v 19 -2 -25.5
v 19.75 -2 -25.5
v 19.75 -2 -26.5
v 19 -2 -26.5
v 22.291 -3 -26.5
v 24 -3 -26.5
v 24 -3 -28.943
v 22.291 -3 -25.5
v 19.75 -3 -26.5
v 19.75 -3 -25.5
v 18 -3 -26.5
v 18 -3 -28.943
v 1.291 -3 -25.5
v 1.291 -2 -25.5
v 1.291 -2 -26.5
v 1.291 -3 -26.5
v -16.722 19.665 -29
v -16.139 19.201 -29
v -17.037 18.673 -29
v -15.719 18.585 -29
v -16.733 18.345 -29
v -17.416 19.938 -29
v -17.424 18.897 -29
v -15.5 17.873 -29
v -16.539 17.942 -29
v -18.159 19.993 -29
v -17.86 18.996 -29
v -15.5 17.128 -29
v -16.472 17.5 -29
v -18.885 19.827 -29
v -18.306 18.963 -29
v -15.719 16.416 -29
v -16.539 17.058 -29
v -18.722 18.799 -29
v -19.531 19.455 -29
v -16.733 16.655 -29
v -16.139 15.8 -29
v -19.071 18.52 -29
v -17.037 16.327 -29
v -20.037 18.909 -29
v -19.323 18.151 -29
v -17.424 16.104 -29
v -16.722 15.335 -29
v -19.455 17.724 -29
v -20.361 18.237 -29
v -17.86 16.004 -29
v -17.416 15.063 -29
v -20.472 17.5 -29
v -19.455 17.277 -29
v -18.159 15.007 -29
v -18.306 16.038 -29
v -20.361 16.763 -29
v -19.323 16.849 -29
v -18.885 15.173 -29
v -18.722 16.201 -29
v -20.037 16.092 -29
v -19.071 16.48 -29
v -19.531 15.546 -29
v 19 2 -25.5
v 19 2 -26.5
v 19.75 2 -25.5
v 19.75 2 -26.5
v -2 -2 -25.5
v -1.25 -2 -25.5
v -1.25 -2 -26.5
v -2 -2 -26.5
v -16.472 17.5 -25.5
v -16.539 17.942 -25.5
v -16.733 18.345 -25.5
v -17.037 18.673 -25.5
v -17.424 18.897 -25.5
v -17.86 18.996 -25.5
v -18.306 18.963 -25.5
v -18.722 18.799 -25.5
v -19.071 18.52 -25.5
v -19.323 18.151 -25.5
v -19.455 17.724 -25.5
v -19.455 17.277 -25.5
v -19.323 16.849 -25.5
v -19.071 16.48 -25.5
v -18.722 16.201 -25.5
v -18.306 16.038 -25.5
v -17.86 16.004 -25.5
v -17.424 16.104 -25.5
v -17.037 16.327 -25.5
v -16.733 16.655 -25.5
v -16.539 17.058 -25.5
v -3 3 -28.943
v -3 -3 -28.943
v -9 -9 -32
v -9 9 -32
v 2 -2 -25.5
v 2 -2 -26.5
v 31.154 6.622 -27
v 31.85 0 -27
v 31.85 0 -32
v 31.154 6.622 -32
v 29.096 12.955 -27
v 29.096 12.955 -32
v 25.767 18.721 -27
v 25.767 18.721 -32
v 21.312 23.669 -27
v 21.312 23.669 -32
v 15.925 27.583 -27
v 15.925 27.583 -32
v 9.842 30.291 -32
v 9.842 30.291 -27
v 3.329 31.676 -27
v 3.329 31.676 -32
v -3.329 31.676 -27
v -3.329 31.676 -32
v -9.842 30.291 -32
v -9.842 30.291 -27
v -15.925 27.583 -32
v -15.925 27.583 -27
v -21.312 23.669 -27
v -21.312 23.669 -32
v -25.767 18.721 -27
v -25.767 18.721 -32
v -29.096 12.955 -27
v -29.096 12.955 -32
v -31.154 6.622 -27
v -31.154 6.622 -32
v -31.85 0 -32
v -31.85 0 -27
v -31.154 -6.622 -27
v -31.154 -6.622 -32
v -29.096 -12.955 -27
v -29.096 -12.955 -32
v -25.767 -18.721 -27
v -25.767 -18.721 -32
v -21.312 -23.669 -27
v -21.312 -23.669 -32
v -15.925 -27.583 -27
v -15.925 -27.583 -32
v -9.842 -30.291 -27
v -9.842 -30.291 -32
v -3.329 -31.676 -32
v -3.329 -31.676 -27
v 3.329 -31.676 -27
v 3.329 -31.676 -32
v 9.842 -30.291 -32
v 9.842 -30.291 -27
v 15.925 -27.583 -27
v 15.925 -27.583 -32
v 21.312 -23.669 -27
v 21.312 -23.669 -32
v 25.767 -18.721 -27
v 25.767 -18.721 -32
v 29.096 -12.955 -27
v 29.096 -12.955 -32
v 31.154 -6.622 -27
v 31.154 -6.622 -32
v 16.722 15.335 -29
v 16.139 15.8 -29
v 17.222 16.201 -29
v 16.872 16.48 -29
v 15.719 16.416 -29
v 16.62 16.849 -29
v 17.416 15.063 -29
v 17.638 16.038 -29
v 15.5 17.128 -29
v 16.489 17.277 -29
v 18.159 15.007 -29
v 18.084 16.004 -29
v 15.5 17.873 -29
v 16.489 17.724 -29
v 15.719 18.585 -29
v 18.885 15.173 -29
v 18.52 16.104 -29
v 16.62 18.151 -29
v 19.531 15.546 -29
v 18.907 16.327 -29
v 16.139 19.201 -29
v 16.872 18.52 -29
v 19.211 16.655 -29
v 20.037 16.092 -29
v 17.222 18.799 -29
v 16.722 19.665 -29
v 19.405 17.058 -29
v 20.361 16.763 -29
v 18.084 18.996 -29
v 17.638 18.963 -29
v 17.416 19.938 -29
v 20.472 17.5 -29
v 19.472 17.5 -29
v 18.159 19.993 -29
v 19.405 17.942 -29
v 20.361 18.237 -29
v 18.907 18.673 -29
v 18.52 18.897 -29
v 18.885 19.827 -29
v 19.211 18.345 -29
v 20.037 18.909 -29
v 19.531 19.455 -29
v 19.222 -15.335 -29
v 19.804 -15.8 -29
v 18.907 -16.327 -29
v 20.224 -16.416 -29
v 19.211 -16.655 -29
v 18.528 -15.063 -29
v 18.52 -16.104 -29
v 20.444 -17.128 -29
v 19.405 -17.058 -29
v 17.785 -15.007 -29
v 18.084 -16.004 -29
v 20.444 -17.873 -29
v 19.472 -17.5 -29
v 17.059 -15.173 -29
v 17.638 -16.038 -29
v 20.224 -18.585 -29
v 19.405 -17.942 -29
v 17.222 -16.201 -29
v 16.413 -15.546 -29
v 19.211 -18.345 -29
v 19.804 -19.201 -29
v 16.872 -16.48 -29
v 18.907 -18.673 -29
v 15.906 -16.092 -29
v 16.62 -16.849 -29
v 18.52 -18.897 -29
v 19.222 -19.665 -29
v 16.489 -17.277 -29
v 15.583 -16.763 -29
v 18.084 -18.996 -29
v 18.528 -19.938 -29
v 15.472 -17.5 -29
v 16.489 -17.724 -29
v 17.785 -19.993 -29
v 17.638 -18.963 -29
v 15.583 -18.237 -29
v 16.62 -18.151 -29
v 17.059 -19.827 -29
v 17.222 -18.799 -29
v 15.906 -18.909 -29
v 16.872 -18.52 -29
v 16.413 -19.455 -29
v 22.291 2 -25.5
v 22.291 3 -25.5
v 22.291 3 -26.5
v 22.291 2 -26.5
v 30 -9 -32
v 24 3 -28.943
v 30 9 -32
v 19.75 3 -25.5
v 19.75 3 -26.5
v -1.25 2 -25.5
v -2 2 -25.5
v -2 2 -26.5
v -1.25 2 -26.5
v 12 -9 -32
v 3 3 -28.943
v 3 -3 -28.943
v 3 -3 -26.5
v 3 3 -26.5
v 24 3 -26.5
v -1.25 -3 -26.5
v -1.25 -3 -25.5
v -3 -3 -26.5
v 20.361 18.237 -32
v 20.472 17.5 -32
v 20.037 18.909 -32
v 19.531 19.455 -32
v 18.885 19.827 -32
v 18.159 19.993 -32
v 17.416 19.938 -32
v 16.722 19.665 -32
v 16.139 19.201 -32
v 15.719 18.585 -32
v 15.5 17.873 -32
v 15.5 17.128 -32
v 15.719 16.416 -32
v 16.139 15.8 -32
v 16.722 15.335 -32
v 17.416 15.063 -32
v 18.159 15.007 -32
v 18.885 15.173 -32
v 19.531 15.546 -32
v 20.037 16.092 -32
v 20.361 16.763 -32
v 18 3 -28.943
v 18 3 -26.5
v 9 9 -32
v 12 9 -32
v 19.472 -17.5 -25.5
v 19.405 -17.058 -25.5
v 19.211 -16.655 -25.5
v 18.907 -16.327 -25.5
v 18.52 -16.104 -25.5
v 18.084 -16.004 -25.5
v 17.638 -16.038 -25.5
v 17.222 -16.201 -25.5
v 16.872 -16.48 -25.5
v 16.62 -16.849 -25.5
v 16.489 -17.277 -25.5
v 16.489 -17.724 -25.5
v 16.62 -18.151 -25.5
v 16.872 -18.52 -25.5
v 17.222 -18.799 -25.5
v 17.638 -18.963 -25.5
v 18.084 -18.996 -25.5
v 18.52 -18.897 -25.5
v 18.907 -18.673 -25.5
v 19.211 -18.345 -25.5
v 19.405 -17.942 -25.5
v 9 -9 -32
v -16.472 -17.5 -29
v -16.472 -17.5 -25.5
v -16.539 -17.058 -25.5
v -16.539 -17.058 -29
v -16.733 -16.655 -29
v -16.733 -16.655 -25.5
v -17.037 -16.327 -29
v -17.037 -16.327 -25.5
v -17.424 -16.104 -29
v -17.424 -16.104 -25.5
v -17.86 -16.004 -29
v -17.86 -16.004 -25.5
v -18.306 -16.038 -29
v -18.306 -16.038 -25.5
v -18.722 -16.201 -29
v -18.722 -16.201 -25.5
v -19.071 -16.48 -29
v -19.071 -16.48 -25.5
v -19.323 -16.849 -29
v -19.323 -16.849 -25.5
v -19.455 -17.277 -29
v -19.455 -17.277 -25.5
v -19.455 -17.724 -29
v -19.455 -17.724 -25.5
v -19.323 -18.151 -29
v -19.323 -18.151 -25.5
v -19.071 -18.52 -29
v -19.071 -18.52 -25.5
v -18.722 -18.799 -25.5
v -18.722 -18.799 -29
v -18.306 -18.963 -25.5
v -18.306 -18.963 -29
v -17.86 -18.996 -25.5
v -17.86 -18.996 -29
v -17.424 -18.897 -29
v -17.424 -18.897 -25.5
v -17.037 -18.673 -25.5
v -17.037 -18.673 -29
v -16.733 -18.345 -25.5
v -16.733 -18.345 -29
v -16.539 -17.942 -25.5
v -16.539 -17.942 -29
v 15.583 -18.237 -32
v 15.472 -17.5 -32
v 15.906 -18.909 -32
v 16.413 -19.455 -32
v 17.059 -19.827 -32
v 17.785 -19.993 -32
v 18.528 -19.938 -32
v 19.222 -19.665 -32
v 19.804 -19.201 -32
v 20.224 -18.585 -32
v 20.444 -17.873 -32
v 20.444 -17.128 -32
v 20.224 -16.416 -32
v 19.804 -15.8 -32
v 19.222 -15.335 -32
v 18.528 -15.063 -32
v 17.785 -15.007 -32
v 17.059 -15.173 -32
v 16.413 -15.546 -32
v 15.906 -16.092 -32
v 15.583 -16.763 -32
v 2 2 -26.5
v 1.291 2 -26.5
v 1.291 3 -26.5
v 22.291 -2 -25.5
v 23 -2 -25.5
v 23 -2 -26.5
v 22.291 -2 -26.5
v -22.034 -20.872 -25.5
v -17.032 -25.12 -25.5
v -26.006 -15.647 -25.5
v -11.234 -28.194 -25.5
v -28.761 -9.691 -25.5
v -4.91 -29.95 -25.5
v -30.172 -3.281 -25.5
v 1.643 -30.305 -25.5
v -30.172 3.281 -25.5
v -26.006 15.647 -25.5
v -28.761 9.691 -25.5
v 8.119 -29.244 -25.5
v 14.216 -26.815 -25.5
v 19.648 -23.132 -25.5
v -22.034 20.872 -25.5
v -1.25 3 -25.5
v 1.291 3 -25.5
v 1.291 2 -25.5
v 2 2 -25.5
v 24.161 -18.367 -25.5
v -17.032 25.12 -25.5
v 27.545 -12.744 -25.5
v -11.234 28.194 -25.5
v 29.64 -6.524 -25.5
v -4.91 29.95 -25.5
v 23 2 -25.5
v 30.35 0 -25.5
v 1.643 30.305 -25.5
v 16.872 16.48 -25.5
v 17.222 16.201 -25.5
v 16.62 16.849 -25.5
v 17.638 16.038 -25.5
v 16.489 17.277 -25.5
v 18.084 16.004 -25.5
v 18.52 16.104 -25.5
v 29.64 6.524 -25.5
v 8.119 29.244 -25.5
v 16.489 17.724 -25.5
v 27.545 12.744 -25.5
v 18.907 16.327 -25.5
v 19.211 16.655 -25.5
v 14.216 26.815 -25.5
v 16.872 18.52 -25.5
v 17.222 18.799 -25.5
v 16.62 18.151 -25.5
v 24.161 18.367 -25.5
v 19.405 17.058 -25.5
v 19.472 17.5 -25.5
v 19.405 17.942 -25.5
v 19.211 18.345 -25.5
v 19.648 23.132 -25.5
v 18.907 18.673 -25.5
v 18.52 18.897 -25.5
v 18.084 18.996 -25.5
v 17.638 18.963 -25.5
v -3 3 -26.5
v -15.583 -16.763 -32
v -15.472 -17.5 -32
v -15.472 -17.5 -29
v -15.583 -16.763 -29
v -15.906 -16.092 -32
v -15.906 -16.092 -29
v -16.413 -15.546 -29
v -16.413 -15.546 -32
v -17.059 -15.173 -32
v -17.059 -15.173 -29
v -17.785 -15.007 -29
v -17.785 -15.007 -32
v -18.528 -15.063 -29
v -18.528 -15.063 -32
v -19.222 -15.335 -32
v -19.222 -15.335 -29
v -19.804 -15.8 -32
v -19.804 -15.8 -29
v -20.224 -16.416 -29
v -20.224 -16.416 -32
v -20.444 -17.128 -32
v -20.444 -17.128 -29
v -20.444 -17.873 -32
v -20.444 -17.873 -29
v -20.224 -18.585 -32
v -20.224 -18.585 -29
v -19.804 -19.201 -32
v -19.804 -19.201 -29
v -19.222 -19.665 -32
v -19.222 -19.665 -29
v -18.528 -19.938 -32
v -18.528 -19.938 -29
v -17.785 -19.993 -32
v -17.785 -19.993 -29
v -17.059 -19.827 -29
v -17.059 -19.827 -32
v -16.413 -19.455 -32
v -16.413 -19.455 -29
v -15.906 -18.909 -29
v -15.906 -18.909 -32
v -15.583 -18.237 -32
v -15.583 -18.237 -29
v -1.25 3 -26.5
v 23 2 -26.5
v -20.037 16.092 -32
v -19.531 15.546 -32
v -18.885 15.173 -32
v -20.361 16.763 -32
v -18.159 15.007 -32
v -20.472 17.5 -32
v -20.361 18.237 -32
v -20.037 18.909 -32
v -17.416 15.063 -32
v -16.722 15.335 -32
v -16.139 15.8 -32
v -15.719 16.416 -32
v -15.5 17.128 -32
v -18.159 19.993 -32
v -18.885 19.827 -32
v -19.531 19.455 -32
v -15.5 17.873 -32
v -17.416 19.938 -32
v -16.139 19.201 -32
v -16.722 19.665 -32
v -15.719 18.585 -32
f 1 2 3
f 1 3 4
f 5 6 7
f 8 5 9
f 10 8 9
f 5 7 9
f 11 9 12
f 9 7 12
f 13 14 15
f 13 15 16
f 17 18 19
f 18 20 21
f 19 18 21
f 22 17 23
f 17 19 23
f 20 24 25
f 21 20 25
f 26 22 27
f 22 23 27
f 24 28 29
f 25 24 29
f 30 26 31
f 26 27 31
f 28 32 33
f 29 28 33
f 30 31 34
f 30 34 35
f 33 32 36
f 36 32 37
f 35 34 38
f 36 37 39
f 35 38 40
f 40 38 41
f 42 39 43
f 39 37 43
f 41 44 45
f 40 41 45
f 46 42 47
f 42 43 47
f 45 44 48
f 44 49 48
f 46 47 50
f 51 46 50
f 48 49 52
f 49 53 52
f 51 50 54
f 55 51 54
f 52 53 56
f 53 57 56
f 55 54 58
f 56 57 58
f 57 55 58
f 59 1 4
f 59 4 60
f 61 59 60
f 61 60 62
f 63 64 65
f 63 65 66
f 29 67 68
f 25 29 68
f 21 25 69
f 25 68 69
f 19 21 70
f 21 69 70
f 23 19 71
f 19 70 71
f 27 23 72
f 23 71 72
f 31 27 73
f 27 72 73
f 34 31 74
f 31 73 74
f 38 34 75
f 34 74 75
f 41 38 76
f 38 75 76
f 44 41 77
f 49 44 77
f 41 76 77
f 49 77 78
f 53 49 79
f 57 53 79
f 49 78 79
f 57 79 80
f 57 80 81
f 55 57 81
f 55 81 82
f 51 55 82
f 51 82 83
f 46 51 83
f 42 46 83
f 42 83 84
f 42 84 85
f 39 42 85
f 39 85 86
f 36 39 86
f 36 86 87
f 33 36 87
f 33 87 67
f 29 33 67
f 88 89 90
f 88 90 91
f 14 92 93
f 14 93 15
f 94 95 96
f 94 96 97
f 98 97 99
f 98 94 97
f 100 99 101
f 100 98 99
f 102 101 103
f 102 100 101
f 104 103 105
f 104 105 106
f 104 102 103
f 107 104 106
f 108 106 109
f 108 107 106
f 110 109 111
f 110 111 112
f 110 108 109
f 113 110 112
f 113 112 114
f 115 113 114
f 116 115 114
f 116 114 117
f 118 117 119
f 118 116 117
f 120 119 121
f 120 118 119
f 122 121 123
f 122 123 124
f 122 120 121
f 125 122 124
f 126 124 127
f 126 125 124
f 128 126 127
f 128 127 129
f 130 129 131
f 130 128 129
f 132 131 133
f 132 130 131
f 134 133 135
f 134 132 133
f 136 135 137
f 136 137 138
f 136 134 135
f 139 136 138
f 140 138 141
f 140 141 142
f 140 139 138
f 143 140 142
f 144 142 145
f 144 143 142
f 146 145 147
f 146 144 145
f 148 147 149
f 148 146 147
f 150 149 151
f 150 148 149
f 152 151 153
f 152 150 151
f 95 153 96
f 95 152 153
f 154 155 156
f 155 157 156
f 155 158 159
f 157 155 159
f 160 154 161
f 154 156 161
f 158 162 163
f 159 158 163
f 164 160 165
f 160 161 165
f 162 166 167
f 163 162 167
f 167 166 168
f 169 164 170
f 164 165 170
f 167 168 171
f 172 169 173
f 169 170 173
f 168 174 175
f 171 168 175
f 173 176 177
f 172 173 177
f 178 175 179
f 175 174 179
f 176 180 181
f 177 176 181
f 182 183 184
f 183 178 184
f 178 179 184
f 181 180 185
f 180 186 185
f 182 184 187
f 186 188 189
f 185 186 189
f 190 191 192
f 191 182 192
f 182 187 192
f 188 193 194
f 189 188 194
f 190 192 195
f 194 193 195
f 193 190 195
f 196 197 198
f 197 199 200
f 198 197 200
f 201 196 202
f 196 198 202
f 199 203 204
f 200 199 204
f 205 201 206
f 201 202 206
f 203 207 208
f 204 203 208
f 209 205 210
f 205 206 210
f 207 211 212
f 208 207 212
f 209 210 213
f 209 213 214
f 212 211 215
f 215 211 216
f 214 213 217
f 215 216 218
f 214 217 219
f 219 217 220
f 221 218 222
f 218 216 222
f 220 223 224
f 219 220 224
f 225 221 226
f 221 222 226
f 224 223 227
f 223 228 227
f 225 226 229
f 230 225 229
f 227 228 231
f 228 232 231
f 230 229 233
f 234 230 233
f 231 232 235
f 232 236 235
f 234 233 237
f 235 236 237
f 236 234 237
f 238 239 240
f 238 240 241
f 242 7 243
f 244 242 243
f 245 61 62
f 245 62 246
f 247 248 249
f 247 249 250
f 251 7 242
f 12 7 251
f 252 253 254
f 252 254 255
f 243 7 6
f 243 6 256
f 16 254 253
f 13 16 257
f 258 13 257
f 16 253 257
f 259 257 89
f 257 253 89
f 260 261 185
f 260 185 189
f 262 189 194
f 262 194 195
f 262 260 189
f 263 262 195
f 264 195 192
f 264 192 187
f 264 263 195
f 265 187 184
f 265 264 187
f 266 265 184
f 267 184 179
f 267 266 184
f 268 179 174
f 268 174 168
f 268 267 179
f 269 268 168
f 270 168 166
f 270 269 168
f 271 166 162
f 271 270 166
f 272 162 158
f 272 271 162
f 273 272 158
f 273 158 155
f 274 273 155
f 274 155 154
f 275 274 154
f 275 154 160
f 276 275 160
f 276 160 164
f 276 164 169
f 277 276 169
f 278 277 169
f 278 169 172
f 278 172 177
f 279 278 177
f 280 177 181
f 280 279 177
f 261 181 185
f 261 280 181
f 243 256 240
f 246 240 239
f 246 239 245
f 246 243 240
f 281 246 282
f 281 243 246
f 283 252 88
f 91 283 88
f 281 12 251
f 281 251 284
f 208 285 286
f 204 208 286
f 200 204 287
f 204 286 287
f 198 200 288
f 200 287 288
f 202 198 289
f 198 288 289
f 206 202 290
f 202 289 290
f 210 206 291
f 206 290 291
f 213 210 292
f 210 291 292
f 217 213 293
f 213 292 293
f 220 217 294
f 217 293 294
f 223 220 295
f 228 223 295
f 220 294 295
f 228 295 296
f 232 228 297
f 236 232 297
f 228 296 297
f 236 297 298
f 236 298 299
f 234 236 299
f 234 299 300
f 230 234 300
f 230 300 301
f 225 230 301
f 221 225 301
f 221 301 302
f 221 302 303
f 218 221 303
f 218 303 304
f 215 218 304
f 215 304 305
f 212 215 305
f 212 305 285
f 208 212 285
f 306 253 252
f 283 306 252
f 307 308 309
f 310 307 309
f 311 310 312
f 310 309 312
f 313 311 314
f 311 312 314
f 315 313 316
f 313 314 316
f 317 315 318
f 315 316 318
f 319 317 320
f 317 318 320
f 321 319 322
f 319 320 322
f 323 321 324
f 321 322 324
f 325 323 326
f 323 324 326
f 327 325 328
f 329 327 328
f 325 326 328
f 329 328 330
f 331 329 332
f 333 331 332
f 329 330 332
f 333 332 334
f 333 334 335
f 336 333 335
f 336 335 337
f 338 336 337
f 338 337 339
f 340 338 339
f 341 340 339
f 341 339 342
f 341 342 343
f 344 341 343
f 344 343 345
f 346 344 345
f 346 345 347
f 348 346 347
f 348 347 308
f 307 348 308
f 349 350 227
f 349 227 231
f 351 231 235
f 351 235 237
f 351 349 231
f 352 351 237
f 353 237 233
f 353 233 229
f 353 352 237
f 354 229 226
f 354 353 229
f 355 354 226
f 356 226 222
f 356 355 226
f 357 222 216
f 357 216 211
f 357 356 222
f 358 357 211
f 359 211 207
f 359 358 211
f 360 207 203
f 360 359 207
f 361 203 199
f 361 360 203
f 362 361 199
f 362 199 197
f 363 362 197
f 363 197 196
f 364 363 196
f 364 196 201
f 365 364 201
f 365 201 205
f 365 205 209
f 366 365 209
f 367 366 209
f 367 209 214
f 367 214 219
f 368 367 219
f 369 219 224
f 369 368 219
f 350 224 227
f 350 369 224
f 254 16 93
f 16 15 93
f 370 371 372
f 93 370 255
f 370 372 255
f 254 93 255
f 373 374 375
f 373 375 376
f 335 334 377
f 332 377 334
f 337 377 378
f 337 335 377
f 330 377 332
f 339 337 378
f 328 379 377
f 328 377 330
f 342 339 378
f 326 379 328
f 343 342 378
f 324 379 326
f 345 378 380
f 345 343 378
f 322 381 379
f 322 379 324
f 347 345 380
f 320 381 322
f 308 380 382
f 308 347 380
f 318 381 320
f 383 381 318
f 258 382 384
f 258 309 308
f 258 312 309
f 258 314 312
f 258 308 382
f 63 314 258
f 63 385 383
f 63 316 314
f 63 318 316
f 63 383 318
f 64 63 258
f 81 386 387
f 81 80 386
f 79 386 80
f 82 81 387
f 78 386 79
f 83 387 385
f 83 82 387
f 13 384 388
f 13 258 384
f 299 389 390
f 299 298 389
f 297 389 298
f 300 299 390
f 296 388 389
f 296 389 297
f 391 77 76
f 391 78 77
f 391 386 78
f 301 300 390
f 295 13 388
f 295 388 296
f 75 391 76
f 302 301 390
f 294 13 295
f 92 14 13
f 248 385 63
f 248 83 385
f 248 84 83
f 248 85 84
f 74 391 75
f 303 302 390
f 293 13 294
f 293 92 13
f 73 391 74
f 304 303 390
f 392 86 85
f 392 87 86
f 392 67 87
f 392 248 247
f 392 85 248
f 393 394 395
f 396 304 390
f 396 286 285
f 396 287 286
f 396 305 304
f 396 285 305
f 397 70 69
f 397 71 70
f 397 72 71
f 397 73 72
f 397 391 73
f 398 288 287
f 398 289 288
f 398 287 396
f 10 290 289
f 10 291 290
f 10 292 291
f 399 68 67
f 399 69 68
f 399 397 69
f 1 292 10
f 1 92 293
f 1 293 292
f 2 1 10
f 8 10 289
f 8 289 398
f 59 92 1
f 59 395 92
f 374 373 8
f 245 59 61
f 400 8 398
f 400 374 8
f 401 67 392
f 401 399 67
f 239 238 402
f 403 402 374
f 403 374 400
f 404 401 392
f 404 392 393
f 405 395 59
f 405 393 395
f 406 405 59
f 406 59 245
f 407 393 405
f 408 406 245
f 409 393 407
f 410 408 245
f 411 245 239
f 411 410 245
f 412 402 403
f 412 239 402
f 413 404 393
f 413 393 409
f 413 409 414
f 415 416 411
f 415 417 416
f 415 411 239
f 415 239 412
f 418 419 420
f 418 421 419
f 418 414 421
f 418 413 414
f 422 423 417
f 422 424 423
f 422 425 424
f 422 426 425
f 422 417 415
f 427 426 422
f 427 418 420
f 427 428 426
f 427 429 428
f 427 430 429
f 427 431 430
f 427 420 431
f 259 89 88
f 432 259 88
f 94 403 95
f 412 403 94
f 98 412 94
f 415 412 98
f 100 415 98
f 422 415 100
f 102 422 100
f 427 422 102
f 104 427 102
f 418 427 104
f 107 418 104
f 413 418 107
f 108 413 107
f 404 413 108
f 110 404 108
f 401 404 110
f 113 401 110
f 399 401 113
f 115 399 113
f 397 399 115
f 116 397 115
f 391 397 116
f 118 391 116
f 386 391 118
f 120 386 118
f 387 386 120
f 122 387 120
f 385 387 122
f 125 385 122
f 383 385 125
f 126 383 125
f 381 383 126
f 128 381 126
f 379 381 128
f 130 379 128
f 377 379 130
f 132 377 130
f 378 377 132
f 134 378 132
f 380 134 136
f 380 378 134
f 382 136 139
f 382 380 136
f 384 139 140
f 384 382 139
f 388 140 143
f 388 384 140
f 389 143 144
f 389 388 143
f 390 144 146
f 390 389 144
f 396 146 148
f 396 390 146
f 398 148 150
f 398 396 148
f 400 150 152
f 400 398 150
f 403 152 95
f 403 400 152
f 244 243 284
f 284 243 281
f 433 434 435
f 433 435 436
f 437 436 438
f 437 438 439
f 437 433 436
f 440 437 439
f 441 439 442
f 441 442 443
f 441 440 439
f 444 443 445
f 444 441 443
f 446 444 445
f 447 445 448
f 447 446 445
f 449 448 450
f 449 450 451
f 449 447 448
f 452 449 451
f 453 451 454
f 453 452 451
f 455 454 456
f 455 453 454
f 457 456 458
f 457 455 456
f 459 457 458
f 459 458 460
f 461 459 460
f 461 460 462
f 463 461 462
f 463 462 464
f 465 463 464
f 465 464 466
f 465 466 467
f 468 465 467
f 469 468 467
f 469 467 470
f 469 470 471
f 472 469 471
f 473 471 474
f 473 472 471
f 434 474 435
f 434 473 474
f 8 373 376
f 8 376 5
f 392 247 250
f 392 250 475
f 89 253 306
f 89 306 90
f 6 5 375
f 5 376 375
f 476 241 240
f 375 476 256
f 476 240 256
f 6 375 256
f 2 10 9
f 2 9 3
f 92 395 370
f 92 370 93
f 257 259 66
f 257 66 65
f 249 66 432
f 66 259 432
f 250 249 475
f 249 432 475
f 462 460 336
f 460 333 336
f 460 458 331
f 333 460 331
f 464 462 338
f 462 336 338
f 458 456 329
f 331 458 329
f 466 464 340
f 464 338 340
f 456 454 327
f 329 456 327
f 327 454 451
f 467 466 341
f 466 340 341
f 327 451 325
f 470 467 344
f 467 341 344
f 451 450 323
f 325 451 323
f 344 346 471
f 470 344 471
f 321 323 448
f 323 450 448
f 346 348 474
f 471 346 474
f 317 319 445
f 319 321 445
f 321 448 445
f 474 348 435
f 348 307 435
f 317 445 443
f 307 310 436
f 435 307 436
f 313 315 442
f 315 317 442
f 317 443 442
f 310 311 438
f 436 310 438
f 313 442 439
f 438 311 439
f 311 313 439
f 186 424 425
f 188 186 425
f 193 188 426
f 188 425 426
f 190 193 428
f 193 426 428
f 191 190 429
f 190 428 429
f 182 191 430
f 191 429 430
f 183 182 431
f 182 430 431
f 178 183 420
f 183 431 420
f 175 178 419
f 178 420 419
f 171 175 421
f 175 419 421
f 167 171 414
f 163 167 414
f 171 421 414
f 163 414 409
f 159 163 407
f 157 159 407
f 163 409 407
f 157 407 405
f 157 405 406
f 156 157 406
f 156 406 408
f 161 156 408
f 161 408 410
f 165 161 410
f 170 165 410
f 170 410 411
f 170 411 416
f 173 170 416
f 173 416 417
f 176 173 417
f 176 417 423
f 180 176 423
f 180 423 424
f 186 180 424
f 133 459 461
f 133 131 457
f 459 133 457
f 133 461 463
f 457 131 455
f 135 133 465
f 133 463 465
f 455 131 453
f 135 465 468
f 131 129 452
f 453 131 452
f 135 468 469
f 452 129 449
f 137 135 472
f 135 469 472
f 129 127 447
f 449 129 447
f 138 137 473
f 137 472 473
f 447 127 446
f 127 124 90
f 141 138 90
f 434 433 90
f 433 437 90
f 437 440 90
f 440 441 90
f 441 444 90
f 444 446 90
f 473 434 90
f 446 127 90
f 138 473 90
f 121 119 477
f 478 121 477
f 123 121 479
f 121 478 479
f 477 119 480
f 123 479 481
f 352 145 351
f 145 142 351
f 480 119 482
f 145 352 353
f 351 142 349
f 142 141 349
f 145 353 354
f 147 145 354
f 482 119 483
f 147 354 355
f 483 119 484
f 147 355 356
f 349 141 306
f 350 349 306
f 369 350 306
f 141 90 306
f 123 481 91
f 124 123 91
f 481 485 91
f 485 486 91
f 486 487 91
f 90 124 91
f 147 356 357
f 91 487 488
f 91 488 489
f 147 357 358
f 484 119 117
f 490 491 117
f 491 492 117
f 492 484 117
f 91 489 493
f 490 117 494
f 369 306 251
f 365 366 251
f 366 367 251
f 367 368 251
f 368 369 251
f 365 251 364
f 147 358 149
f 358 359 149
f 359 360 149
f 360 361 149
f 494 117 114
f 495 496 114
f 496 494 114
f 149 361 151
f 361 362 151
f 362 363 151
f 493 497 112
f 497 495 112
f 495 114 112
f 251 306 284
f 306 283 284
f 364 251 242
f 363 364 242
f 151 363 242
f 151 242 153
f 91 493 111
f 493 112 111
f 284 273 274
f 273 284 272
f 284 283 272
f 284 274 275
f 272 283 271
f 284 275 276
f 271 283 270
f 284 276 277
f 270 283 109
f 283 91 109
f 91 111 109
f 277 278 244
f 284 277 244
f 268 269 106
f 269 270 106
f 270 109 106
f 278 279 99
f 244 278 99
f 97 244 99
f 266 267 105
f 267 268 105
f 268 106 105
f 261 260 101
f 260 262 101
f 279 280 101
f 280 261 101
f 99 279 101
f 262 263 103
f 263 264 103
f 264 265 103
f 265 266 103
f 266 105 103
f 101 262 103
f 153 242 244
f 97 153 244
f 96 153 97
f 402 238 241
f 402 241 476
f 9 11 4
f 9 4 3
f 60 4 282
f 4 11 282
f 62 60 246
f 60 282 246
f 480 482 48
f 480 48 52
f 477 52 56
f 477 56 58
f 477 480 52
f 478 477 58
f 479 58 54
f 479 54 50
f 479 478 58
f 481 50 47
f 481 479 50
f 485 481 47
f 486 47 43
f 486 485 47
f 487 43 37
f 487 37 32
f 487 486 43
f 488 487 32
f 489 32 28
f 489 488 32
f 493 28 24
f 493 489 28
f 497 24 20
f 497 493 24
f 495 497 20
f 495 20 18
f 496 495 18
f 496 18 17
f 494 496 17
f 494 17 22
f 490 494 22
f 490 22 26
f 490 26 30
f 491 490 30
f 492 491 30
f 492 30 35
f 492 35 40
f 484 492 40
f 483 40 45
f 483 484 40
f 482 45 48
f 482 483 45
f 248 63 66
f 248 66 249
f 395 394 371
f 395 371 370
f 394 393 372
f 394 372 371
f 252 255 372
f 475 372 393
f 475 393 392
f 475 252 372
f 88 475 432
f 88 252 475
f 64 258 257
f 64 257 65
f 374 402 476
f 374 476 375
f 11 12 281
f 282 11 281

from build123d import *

# Parameters (mm, degrees)
SKETCH2_R           = 31.85
BOSS_EXTRUDE1_DEPTH = 6.5
SKETCH3_W           = 6
SKETCH3_H           = 6
CUT_EXTRUDE1_DEPTH  = 6.5
CHAMFER1_SIZE       = 6
CHAMFER1_SIZE2      = 3.057152697
SKETCH5_R           = 1.5
CUT_EXTRUDE2_DEPTH  = 56.252556502
SKETCH6_R           = 2.5
CUT_EXTRUDE3_DEPTH  = 3
CHAMFER3_SIZE       = 1.5
BOSS_EXTRUDE2_DEPTH = 1


with BuildPart() as part:
    # Sketch2 → Boss-Extrude1 (new body)
    with BuildSketch(Plane.XY.offset(-25.5)):
        Circle(SKETCH2_R)
    extrude(amount=-BOSS_EXTRUDE1_DEPTH)

    # Sketch3 → Cut-Extrude1 (cut)
    with BuildSketch(Plane(origin=(0, 0, -32), x_dir=(-1, 0, 0), z_dir=(0, 0, -1))):
        with Locations((-21, 0)):
            Rectangle(SKETCH3_W, SKETCH3_H)
        Rectangle(SKETCH3_W, SKETCH3_H)
    extrude(amount=-CUT_EXTRUDE1_DEPTH, mode=Mode.SUBTRACT)

    # Chamfer1
    chamfer1_edges = [part.edges().sort_by_distance(p)[0] for p in [
        (3, 0, -32),
        (0, -3, -32),
        (-3, 0, -32),
        (0, 3, -32),
        (24, 0, -32),
        (21, -3, -32),
        (18, 0, -32),
        (21, 3, -32),
    ]]
    chamfer1_side = [part.faces().sort_by_distance(p)[0] for p in [
        (-30.949145961, 0, -32),
    ]]
    chamfer(chamfer1_edges, length=CHAMFER1_SIZE, length2=CHAMFER1_SIZE2, reference=chamfer1_side[0])

    # Sketch5 → Cut-Extrude2 (cut, through all)
    with BuildSketch(Plane.XY):
        with Locations((-17.971861544, -17.500238124)):
            Circle(SKETCH5_R)
        with Locations((17.971861544, -17.500238124)):
            Circle(SKETCH5_R)
        with Locations((17.971861544, 17.500238124)):
            Circle(SKETCH5_R)
        with Locations((-17.971861544, 17.500238124)):
            Circle(SKETCH5_R)
    extrude(amount=-CUT_EXTRUDE2_DEPTH, mode=Mode.SUBTRACT)

    # Sketch6 → Cut-Extrude3 (cut)
    with BuildSketch(Plane.XY.offset(-32)):
        with Locations((-17.971861544, -17.500238124)):
            Circle(SKETCH6_R)
        with Locations(Location((17.971861544, -17.500238124, 0), (0, 0, 180))):
            Circle(SKETCH6_R)
        with Locations((17.971861544, 17.500238124)):
            Circle(SKETCH6_R)
        with Locations(Location((-17.971861544, 17.500238124, 0), (0, 0, 180))):
            Circle(SKETCH6_R)
    extrude(amount=CUT_EXTRUDE3_DEPTH, mode=Mode.SUBTRACT)

    # Chamfer3
    chamfer3_edges = [part.edges().sort_by_distance(p)[0] for p in [
        (-31.85, 0, -25.5),
    ]]
    chamfer(chamfer3_edges, length=CHAMFER3_SIZE)

    # Sketch7 → Boss-Extrude2 (add)
    with BuildSketch(Plane.XY.offset(-25.5)):
        Polygon((-1.25, -2), (-2, -2), (-2, 2), (-1.25, 2), (-1.25, 3), (-3, 3), (-3, -3), (-1.25, -3), align=None)
        Polygon((1.2909118, -3), (3, -3), (3, 3), (1.2909118, 3), (1.2909118, 2), (2, 2), (2, -2), (1.2909118, -2), align=None)
        Polygon((19.75, -2), (19, -2), (19, 2), (19.75, 2), (19.75, 3), (18, 3), (18, -3), (19.75, -3), align=None)
        Polygon((22.2909118, -3), (24, -3), (24, 3), (22.2909118, 3), (22.2909118, 2), (23, 2), (23, -2), (22.2909118, -2), align=None)
    extrude(amount=-BOSS_EXTRUDE2_DEPTH)


solid = part.part
